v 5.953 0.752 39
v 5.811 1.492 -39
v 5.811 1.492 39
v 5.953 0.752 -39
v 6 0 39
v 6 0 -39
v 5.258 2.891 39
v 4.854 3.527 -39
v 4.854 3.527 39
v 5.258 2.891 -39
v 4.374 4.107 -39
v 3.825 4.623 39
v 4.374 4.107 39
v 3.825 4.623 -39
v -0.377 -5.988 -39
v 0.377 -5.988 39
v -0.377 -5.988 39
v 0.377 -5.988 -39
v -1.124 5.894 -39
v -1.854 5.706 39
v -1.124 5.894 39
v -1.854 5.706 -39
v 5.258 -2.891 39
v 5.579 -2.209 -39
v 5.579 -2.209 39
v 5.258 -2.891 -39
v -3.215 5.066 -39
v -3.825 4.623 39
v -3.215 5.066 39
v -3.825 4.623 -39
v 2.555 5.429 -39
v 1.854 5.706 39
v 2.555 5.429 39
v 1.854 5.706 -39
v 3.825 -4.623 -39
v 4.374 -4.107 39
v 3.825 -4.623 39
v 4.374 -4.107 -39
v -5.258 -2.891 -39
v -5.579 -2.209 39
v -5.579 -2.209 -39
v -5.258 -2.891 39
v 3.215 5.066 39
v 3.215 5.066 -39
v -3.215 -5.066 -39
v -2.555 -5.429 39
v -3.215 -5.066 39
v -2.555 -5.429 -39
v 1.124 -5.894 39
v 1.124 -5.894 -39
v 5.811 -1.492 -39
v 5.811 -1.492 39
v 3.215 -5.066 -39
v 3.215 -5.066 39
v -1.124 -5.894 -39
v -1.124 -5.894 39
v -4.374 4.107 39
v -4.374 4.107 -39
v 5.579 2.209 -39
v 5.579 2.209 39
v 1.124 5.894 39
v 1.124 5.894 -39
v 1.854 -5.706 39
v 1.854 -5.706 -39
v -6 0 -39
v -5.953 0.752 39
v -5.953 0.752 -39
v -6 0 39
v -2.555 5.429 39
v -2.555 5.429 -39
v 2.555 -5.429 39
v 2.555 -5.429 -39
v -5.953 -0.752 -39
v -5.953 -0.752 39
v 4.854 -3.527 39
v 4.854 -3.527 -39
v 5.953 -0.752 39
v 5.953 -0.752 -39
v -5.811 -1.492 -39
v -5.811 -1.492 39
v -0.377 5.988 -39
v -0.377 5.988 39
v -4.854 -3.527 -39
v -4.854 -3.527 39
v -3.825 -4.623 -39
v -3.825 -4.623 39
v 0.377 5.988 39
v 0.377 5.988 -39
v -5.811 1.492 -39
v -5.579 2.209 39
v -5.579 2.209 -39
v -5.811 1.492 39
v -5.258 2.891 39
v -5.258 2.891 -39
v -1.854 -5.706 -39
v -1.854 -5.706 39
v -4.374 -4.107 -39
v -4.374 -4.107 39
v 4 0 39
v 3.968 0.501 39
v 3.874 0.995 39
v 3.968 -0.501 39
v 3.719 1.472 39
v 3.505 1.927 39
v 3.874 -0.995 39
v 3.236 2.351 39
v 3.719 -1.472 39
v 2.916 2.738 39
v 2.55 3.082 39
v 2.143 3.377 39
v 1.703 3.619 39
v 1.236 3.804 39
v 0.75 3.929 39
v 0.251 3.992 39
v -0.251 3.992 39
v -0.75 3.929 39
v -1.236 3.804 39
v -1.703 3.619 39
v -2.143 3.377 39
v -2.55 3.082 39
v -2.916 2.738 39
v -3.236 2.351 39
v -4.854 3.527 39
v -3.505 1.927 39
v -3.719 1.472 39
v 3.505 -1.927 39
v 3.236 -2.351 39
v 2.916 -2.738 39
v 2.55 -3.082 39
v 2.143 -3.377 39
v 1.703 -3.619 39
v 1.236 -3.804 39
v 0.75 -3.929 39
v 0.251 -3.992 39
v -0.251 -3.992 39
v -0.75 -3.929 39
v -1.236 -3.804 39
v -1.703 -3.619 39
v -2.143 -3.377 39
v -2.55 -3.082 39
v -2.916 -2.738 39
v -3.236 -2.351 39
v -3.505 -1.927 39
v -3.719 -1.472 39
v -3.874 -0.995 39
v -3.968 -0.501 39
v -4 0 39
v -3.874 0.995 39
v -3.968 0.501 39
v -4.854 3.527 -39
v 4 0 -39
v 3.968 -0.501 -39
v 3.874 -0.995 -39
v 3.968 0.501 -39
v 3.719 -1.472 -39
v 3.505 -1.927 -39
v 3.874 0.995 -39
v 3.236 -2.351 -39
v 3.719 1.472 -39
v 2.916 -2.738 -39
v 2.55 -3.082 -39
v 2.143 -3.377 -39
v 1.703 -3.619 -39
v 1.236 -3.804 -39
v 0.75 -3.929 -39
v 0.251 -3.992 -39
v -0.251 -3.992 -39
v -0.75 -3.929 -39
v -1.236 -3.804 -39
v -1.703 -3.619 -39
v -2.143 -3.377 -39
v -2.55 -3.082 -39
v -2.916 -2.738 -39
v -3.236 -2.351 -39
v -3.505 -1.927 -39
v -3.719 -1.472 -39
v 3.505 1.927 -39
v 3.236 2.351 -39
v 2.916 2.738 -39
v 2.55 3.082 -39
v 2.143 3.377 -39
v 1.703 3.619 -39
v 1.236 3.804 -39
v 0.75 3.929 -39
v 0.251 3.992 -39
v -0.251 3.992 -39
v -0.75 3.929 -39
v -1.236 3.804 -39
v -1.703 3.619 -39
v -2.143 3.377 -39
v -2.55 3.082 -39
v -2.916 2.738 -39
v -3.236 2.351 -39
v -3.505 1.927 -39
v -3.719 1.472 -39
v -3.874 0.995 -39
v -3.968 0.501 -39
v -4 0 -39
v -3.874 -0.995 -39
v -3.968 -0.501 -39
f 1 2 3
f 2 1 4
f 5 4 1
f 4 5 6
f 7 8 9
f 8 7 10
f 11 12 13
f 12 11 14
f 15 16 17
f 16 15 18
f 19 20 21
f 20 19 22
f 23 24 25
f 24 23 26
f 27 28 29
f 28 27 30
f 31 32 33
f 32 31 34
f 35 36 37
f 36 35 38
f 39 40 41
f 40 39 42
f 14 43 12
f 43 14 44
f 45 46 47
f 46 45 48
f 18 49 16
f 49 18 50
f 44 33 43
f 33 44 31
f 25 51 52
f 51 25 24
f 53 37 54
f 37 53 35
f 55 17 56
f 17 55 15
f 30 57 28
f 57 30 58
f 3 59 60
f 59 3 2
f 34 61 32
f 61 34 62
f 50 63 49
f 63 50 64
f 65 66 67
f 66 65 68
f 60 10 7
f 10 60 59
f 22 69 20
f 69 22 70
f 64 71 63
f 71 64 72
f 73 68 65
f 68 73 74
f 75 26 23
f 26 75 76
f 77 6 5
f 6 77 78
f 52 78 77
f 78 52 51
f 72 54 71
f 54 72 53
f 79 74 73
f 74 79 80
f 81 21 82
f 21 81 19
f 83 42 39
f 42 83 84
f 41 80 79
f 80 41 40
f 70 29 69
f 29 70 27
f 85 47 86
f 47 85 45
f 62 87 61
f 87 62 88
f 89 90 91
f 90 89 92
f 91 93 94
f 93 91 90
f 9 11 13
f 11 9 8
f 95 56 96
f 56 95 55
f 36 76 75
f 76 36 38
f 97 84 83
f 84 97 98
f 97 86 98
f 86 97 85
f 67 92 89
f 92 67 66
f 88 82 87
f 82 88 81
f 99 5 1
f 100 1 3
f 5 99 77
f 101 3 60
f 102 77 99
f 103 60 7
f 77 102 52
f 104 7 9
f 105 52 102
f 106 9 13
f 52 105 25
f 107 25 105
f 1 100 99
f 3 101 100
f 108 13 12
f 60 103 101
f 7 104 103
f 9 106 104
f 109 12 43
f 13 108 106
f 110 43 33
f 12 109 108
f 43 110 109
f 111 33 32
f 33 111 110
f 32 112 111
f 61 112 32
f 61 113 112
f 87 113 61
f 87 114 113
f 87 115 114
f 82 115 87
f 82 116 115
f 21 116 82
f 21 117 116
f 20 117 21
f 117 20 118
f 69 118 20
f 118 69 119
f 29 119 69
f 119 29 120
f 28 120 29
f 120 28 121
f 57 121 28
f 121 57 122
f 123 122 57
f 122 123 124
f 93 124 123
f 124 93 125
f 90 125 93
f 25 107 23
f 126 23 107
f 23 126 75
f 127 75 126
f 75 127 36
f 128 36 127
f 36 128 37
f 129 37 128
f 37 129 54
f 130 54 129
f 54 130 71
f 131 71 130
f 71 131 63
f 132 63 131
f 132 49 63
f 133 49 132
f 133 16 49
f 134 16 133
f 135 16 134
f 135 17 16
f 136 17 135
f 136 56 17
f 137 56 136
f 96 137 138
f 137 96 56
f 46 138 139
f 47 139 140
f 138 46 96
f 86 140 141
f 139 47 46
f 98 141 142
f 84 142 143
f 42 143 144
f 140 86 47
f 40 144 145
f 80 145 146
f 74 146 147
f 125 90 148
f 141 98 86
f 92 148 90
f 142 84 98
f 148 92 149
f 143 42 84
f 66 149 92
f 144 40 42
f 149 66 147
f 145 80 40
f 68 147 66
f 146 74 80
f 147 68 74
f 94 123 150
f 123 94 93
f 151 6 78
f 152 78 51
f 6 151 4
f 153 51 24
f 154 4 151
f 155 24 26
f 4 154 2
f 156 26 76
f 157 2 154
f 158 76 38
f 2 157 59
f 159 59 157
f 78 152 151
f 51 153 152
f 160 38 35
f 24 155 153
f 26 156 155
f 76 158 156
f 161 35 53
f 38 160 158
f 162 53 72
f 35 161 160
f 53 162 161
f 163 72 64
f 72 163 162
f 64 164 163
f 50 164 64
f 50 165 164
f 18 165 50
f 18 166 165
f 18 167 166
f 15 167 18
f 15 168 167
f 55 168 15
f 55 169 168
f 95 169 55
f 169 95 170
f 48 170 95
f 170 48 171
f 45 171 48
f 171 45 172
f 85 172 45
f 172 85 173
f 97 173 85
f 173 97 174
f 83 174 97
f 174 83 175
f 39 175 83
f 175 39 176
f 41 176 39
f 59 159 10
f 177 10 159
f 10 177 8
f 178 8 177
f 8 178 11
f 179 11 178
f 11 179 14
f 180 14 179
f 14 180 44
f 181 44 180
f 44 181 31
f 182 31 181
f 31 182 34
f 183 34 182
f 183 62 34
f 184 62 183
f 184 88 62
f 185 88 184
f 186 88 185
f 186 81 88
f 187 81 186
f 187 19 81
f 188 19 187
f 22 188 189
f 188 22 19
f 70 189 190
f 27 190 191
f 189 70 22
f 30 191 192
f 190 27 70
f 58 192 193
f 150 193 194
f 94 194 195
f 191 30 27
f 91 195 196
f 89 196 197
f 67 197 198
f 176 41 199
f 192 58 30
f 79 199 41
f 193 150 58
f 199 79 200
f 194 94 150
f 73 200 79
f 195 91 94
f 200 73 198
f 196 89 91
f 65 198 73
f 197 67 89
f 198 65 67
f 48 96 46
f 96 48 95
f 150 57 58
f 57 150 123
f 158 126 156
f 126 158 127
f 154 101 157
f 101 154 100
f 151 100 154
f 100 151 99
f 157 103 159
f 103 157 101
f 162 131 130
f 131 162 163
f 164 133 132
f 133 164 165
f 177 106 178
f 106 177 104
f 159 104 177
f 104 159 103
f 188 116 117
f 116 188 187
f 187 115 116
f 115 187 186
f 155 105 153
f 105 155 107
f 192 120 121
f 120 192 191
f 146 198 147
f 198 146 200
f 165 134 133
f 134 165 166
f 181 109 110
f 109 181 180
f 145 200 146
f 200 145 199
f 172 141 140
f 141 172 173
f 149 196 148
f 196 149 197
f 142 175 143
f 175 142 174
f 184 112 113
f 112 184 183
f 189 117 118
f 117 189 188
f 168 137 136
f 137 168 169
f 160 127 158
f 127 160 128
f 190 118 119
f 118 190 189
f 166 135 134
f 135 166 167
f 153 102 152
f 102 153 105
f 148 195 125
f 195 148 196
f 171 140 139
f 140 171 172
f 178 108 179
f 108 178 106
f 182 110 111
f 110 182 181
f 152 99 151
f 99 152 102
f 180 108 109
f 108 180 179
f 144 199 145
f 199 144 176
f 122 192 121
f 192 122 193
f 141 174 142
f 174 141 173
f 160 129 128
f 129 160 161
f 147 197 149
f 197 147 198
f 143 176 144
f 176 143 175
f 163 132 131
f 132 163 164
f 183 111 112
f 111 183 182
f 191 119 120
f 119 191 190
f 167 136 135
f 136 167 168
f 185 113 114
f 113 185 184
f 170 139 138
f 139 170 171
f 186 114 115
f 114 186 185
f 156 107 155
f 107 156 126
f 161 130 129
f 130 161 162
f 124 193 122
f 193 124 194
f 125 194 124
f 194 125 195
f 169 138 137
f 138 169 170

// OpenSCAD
$fn = 50;


difference() {
	union() {
		translate(v = [0, 0, -39.0000000000]) {
			cylinder(h = 78, r = 6.0000000000);
		}
	}
	union() {
		translate(v = [0, 0, -100.0000000000]) {
			cylinder(h = 200, r = 4.0000000000);
		}
	}
}
